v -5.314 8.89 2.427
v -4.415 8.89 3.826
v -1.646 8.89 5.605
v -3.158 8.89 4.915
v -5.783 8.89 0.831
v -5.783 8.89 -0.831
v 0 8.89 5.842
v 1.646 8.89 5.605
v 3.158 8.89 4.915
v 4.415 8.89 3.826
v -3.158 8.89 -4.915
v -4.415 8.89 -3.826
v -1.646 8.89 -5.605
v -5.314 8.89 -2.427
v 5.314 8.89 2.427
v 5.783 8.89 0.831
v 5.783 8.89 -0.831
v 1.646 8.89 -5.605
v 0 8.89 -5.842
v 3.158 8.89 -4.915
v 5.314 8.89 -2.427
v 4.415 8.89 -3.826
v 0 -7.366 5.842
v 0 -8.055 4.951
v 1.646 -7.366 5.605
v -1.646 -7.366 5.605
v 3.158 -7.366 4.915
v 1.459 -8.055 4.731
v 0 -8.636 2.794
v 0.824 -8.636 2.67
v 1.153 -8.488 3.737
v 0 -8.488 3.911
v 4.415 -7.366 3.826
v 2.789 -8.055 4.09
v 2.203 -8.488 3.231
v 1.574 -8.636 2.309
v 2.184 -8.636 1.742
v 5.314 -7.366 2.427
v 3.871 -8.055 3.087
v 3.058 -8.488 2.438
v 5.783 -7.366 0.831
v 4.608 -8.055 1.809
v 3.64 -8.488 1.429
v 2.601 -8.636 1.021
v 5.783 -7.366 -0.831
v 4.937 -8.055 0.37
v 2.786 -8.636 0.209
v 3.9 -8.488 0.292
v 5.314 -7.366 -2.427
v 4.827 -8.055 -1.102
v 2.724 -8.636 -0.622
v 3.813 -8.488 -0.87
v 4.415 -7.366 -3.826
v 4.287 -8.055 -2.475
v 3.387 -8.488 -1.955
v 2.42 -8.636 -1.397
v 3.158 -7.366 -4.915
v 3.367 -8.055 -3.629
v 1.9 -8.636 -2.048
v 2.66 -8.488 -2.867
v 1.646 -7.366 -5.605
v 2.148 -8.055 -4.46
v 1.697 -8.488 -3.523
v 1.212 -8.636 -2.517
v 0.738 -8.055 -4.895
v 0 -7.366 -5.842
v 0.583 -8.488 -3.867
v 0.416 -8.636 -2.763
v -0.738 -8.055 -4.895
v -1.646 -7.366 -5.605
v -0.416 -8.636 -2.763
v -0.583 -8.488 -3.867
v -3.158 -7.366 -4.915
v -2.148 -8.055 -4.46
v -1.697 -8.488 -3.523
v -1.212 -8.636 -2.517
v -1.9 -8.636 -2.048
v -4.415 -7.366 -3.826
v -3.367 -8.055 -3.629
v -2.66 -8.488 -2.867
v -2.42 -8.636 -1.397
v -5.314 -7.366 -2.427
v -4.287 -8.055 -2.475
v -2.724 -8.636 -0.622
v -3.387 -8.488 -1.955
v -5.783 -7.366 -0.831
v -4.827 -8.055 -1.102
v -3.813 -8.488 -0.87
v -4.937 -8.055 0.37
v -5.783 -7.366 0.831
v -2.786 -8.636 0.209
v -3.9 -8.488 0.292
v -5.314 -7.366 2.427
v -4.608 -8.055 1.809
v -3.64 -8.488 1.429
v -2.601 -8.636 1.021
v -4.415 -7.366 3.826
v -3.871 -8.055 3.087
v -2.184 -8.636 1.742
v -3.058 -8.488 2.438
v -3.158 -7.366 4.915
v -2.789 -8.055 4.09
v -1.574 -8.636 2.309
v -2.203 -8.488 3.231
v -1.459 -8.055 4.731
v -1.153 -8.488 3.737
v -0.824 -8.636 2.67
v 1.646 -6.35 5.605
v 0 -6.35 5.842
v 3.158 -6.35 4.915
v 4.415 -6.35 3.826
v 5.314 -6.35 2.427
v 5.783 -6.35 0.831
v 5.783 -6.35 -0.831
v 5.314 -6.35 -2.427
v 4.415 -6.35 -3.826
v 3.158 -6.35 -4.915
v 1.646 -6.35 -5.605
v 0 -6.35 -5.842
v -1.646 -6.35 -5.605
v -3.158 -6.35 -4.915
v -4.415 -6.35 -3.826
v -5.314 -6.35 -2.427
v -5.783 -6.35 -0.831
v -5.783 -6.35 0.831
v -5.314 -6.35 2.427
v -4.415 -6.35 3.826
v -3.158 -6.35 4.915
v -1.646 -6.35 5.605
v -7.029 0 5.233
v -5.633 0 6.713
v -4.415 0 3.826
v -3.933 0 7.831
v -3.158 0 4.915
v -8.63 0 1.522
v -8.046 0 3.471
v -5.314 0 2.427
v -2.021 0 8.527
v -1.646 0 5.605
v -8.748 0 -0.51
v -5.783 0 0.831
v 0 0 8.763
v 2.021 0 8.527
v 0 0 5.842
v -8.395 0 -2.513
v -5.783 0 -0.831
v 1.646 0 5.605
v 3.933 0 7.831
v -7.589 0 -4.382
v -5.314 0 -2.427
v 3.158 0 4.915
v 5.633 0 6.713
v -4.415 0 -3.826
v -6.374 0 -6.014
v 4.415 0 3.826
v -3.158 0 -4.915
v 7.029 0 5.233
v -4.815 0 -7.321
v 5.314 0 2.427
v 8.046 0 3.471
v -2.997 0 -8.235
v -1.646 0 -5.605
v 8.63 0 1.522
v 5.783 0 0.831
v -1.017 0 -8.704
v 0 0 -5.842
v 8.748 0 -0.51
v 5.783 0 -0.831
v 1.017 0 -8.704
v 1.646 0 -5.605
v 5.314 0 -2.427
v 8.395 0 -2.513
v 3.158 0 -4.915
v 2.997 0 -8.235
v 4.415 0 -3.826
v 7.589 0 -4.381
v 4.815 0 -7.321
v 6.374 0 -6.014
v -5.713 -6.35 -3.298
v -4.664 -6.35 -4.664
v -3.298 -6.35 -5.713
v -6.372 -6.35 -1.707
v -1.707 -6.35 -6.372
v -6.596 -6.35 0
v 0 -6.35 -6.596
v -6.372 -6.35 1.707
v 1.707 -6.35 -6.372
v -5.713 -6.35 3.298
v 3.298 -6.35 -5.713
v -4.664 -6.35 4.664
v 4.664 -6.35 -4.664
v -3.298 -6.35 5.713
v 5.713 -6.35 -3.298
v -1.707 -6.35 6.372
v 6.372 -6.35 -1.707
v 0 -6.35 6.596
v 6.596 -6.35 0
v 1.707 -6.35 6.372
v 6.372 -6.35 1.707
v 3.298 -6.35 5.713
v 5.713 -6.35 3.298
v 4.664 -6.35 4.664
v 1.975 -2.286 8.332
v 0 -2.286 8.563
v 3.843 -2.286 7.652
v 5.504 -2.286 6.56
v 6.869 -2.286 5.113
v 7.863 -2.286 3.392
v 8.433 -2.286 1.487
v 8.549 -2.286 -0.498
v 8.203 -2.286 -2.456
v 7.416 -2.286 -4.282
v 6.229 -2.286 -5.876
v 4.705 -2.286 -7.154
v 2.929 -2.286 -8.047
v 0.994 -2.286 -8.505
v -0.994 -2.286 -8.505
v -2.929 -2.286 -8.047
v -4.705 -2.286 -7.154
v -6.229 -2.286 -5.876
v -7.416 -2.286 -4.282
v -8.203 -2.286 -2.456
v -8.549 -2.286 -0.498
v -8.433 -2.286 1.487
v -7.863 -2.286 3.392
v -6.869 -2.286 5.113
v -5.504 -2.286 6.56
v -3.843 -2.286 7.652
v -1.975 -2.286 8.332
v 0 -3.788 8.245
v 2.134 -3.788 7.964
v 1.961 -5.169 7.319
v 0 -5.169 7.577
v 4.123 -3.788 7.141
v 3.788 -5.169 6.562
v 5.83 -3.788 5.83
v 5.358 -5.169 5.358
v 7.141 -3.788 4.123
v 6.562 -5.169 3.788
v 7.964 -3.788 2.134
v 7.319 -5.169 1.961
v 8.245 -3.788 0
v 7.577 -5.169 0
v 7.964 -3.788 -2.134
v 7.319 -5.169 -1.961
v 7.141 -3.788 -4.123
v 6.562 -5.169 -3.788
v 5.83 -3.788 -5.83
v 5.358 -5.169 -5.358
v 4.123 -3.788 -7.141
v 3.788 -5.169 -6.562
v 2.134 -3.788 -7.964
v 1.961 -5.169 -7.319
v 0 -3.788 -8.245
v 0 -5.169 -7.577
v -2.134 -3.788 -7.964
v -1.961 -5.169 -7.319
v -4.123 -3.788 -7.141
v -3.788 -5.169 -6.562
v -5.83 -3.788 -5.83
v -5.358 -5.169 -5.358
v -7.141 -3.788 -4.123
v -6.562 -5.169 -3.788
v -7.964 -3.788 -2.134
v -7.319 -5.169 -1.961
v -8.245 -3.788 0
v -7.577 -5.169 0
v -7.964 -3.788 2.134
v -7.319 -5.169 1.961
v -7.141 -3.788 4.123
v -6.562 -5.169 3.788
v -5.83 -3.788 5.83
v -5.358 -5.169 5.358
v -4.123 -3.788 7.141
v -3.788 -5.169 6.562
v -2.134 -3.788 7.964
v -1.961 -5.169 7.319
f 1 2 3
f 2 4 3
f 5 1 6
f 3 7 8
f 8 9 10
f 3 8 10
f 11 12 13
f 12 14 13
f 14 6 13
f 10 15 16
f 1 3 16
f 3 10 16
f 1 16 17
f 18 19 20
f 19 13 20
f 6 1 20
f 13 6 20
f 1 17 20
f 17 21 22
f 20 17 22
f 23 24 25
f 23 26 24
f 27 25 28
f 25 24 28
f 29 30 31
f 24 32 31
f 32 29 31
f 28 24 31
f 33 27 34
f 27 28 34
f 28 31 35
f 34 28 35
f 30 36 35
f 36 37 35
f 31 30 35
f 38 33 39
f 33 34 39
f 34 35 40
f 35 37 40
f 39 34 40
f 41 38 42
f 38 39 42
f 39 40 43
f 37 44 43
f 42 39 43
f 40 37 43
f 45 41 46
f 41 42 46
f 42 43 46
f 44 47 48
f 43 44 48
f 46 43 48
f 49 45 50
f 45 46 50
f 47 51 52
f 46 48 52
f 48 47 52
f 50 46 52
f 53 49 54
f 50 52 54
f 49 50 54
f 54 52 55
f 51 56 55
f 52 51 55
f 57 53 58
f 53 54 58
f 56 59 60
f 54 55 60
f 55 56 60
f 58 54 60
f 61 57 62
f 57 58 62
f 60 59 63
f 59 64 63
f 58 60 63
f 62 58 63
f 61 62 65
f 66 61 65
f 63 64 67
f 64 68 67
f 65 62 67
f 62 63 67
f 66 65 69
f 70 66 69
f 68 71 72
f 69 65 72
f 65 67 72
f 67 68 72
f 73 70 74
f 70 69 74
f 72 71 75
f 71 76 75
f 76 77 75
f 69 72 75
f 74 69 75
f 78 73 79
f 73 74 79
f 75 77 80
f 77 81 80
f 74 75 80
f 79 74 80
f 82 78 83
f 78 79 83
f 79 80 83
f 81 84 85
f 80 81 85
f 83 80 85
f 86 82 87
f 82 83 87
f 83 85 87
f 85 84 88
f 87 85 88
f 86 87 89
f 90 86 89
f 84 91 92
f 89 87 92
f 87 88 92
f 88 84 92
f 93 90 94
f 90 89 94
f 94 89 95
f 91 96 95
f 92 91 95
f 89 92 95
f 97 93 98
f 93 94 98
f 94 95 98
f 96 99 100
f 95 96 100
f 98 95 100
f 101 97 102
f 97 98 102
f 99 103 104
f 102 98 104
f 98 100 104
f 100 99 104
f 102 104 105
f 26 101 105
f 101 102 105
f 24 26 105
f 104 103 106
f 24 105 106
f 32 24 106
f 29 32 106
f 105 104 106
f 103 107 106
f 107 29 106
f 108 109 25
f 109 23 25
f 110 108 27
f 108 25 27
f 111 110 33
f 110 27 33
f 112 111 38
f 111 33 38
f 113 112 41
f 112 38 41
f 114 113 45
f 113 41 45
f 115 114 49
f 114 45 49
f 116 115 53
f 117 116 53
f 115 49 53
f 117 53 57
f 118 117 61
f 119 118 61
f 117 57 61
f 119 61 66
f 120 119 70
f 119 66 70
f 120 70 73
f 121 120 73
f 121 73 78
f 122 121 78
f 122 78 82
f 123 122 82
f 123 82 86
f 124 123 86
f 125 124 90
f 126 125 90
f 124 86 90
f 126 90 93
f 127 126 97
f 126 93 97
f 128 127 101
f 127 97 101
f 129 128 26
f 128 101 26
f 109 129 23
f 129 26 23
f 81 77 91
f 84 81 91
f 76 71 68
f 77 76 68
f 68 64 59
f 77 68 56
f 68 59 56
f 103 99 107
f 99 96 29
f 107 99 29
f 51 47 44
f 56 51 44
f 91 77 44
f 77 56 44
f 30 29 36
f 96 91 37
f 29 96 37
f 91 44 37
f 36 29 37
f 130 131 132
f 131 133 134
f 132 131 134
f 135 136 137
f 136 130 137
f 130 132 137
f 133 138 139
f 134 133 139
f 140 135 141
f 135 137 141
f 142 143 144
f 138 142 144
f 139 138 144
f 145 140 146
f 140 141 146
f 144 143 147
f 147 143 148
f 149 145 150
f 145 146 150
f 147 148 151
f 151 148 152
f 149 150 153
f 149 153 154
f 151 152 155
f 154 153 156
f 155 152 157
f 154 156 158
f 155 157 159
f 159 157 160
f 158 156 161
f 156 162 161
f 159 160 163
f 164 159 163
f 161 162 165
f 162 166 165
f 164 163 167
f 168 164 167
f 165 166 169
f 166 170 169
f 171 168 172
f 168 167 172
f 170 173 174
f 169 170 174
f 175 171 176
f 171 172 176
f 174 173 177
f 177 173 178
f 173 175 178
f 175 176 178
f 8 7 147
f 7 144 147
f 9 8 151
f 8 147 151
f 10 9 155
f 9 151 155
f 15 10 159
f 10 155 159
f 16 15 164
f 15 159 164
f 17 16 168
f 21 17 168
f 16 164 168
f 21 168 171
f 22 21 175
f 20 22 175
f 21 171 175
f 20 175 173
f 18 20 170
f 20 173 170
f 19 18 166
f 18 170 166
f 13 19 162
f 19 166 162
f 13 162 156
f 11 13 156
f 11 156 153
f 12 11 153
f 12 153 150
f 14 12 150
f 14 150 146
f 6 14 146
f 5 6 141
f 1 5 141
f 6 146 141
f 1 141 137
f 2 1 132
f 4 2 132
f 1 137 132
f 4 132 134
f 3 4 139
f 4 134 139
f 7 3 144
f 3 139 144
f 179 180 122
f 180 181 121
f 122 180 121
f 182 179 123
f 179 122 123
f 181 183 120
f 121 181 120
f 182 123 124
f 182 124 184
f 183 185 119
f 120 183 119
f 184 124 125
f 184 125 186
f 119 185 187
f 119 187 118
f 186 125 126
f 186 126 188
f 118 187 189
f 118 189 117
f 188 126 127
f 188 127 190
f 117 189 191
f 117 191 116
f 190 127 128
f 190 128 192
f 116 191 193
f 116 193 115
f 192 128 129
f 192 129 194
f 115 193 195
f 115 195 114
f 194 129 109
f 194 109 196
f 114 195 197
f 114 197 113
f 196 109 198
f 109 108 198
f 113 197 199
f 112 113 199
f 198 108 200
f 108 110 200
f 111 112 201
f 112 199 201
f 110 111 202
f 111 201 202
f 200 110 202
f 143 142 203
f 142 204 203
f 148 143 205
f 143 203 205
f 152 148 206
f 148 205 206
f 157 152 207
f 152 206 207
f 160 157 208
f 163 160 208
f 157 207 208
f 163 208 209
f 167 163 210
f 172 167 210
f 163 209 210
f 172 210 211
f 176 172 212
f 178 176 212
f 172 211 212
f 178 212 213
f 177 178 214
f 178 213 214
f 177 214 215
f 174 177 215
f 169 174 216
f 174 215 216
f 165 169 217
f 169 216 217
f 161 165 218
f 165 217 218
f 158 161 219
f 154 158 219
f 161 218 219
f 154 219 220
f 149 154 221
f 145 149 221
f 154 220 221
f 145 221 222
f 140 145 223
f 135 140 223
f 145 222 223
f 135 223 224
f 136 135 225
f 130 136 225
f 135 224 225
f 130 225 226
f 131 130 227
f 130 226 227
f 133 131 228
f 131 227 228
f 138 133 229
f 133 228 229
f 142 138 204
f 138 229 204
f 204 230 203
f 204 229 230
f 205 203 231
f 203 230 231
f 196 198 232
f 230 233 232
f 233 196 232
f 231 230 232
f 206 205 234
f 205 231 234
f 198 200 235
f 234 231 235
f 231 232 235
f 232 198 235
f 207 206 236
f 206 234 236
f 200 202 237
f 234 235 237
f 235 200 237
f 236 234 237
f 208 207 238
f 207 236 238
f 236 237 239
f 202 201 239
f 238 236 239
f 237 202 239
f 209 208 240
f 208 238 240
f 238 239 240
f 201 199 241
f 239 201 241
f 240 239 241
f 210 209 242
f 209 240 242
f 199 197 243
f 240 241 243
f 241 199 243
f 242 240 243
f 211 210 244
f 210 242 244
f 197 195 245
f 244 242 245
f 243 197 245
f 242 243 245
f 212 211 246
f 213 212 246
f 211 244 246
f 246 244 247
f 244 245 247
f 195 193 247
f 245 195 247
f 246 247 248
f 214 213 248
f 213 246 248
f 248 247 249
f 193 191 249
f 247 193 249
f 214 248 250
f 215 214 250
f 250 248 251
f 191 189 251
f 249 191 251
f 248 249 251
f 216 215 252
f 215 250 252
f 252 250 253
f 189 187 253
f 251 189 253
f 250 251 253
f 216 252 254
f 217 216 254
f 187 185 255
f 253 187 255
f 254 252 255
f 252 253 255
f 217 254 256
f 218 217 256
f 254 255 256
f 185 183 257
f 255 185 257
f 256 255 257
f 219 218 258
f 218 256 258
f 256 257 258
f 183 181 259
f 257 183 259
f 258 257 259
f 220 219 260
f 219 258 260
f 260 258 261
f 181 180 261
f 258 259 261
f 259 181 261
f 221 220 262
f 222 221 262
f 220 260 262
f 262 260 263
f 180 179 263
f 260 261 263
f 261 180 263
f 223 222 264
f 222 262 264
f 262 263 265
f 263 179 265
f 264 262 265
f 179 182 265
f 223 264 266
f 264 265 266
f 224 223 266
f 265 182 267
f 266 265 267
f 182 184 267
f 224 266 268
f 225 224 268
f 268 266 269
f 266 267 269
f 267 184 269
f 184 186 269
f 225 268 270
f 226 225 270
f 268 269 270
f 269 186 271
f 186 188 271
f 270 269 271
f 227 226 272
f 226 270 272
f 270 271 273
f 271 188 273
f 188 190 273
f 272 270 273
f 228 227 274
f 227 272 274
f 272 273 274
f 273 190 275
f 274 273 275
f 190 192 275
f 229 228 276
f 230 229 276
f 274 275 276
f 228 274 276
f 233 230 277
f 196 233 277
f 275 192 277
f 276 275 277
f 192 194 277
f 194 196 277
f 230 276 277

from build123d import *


with BuildPart() as f1:
    # F0 (on Right) → F1 (revolve)
    with BuildSketch(Plane.YZ):
        with BuildLine():
            Line((-8.636, 0), (8.89, 0))
            Line((8.89, 0), (8.89, 5.842))
            Line((8.89, 5.842), (0, 5.842))
            Line((0, 5.842), (0, 8.763))
            Line((0, 8.763), (-2.286, 8.563001))
            ThreePointArc((-2.286, 8.563001), (-4.498697, 7.953019), (-6.35, 6.596265))
            Line((-6.35, 6.596265), (-6.35, 5.842))
            Line((-6.35, 5.842), (-7.366, 5.842))
            ThreePointArc((-7.366, 5.842), (-8.3058, 4.445), (-8.636, 2.794))
            Line((-8.636, 2.794), (-8.636, 0))
        make_face()
    revolve(axis=Axis((0, 9.913695, 0), (0, 1, 0)))


solid = f1.part
